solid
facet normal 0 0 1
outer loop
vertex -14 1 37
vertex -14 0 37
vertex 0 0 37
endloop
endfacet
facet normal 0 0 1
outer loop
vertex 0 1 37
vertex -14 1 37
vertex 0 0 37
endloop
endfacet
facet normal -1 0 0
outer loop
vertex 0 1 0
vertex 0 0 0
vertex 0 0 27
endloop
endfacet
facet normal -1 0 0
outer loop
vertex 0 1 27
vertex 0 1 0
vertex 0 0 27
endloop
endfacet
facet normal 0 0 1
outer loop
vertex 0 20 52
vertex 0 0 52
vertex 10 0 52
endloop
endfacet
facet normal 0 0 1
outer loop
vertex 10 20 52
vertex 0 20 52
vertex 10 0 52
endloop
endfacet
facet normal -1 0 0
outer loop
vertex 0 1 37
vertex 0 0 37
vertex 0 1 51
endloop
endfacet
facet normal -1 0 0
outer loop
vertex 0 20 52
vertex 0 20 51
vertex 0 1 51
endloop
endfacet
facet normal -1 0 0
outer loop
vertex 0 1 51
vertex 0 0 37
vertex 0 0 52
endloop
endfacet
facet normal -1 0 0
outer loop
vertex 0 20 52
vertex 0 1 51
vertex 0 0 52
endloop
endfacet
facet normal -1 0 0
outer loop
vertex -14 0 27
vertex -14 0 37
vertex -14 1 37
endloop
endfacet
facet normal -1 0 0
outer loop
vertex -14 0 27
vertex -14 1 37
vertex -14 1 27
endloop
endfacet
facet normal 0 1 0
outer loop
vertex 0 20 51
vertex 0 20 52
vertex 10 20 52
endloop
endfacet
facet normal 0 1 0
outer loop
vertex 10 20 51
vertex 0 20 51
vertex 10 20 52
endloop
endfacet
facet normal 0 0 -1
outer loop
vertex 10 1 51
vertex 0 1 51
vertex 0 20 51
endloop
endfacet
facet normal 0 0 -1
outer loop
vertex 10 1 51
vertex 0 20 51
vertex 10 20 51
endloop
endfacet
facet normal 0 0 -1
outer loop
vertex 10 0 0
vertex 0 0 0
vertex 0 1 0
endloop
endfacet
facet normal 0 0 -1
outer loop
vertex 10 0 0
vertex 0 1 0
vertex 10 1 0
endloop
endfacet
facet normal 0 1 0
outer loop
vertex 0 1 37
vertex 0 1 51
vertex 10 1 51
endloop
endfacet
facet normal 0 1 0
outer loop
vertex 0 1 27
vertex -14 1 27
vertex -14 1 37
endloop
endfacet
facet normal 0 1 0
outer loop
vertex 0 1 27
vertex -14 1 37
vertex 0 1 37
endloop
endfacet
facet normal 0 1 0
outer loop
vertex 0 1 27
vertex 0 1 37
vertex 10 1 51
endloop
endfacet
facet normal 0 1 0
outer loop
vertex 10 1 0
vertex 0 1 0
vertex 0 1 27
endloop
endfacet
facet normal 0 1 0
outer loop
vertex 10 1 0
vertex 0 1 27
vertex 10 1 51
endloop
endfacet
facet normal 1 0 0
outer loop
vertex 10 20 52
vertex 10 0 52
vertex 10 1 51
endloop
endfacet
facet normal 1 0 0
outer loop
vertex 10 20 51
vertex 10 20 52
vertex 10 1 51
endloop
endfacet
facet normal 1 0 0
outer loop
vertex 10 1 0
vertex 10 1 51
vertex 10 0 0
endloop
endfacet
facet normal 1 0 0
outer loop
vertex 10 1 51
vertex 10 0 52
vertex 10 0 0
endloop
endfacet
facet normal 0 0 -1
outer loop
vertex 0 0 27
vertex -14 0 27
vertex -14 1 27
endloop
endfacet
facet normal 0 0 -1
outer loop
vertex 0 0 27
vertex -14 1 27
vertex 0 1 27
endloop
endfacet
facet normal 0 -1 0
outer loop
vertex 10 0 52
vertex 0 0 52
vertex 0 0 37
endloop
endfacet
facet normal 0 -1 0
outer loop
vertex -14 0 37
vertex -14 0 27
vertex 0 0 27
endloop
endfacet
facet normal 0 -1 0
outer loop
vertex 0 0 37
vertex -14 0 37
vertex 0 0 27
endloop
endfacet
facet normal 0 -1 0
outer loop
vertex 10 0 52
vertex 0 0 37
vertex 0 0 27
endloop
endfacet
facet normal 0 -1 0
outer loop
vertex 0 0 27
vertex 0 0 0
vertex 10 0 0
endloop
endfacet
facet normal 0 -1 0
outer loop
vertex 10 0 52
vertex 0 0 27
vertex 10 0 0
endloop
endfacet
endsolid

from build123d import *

# Parameters (mm, degrees)
SKETCH1_W           = 10
SKETCH1_H           = 25
SKETCH1_H_2         = 27
SKETCH1_W_2         = 14
SKETCH1_H_3         = 10
BOSS_EXTRUDE1_DEPTH = 1
SKETCH2_W           = 10
SKETCH2_H           = 1
BOSS_EXTRUDE2_DEPTH = 20


with BuildPart() as part:
    # Sketch1 → Boss-Extrude1 (new body)
    with BuildSketch(Plane(origin=(0, 0, 0), x_dir=(1, 0, 0), z_dir=(0, 1, 0))):
        with Locations((5, -39.5)):
            Rectangle(SKETCH1_W, SKETCH1_H)
        with Locations((5, -13.5)):
            Rectangle(SKETCH1_W, SKETCH1_H_2)
        with Locations((-7, -32)):
            Rectangle(SKETCH1_W_2, SKETCH1_H_3)
    extrude(amount=BOSS_EXTRUDE1_DEPTH)

    # Sketch2 → Boss-Extrude2 (add)
    with BuildSketch(Plane.XZ):
        with Locations((5, 51.5)):
            Rectangle(SKETCH2_W, SKETCH2_H)
    extrude(amount=-BOSS_EXTRUDE2_DEPTH)


solid = part.part
